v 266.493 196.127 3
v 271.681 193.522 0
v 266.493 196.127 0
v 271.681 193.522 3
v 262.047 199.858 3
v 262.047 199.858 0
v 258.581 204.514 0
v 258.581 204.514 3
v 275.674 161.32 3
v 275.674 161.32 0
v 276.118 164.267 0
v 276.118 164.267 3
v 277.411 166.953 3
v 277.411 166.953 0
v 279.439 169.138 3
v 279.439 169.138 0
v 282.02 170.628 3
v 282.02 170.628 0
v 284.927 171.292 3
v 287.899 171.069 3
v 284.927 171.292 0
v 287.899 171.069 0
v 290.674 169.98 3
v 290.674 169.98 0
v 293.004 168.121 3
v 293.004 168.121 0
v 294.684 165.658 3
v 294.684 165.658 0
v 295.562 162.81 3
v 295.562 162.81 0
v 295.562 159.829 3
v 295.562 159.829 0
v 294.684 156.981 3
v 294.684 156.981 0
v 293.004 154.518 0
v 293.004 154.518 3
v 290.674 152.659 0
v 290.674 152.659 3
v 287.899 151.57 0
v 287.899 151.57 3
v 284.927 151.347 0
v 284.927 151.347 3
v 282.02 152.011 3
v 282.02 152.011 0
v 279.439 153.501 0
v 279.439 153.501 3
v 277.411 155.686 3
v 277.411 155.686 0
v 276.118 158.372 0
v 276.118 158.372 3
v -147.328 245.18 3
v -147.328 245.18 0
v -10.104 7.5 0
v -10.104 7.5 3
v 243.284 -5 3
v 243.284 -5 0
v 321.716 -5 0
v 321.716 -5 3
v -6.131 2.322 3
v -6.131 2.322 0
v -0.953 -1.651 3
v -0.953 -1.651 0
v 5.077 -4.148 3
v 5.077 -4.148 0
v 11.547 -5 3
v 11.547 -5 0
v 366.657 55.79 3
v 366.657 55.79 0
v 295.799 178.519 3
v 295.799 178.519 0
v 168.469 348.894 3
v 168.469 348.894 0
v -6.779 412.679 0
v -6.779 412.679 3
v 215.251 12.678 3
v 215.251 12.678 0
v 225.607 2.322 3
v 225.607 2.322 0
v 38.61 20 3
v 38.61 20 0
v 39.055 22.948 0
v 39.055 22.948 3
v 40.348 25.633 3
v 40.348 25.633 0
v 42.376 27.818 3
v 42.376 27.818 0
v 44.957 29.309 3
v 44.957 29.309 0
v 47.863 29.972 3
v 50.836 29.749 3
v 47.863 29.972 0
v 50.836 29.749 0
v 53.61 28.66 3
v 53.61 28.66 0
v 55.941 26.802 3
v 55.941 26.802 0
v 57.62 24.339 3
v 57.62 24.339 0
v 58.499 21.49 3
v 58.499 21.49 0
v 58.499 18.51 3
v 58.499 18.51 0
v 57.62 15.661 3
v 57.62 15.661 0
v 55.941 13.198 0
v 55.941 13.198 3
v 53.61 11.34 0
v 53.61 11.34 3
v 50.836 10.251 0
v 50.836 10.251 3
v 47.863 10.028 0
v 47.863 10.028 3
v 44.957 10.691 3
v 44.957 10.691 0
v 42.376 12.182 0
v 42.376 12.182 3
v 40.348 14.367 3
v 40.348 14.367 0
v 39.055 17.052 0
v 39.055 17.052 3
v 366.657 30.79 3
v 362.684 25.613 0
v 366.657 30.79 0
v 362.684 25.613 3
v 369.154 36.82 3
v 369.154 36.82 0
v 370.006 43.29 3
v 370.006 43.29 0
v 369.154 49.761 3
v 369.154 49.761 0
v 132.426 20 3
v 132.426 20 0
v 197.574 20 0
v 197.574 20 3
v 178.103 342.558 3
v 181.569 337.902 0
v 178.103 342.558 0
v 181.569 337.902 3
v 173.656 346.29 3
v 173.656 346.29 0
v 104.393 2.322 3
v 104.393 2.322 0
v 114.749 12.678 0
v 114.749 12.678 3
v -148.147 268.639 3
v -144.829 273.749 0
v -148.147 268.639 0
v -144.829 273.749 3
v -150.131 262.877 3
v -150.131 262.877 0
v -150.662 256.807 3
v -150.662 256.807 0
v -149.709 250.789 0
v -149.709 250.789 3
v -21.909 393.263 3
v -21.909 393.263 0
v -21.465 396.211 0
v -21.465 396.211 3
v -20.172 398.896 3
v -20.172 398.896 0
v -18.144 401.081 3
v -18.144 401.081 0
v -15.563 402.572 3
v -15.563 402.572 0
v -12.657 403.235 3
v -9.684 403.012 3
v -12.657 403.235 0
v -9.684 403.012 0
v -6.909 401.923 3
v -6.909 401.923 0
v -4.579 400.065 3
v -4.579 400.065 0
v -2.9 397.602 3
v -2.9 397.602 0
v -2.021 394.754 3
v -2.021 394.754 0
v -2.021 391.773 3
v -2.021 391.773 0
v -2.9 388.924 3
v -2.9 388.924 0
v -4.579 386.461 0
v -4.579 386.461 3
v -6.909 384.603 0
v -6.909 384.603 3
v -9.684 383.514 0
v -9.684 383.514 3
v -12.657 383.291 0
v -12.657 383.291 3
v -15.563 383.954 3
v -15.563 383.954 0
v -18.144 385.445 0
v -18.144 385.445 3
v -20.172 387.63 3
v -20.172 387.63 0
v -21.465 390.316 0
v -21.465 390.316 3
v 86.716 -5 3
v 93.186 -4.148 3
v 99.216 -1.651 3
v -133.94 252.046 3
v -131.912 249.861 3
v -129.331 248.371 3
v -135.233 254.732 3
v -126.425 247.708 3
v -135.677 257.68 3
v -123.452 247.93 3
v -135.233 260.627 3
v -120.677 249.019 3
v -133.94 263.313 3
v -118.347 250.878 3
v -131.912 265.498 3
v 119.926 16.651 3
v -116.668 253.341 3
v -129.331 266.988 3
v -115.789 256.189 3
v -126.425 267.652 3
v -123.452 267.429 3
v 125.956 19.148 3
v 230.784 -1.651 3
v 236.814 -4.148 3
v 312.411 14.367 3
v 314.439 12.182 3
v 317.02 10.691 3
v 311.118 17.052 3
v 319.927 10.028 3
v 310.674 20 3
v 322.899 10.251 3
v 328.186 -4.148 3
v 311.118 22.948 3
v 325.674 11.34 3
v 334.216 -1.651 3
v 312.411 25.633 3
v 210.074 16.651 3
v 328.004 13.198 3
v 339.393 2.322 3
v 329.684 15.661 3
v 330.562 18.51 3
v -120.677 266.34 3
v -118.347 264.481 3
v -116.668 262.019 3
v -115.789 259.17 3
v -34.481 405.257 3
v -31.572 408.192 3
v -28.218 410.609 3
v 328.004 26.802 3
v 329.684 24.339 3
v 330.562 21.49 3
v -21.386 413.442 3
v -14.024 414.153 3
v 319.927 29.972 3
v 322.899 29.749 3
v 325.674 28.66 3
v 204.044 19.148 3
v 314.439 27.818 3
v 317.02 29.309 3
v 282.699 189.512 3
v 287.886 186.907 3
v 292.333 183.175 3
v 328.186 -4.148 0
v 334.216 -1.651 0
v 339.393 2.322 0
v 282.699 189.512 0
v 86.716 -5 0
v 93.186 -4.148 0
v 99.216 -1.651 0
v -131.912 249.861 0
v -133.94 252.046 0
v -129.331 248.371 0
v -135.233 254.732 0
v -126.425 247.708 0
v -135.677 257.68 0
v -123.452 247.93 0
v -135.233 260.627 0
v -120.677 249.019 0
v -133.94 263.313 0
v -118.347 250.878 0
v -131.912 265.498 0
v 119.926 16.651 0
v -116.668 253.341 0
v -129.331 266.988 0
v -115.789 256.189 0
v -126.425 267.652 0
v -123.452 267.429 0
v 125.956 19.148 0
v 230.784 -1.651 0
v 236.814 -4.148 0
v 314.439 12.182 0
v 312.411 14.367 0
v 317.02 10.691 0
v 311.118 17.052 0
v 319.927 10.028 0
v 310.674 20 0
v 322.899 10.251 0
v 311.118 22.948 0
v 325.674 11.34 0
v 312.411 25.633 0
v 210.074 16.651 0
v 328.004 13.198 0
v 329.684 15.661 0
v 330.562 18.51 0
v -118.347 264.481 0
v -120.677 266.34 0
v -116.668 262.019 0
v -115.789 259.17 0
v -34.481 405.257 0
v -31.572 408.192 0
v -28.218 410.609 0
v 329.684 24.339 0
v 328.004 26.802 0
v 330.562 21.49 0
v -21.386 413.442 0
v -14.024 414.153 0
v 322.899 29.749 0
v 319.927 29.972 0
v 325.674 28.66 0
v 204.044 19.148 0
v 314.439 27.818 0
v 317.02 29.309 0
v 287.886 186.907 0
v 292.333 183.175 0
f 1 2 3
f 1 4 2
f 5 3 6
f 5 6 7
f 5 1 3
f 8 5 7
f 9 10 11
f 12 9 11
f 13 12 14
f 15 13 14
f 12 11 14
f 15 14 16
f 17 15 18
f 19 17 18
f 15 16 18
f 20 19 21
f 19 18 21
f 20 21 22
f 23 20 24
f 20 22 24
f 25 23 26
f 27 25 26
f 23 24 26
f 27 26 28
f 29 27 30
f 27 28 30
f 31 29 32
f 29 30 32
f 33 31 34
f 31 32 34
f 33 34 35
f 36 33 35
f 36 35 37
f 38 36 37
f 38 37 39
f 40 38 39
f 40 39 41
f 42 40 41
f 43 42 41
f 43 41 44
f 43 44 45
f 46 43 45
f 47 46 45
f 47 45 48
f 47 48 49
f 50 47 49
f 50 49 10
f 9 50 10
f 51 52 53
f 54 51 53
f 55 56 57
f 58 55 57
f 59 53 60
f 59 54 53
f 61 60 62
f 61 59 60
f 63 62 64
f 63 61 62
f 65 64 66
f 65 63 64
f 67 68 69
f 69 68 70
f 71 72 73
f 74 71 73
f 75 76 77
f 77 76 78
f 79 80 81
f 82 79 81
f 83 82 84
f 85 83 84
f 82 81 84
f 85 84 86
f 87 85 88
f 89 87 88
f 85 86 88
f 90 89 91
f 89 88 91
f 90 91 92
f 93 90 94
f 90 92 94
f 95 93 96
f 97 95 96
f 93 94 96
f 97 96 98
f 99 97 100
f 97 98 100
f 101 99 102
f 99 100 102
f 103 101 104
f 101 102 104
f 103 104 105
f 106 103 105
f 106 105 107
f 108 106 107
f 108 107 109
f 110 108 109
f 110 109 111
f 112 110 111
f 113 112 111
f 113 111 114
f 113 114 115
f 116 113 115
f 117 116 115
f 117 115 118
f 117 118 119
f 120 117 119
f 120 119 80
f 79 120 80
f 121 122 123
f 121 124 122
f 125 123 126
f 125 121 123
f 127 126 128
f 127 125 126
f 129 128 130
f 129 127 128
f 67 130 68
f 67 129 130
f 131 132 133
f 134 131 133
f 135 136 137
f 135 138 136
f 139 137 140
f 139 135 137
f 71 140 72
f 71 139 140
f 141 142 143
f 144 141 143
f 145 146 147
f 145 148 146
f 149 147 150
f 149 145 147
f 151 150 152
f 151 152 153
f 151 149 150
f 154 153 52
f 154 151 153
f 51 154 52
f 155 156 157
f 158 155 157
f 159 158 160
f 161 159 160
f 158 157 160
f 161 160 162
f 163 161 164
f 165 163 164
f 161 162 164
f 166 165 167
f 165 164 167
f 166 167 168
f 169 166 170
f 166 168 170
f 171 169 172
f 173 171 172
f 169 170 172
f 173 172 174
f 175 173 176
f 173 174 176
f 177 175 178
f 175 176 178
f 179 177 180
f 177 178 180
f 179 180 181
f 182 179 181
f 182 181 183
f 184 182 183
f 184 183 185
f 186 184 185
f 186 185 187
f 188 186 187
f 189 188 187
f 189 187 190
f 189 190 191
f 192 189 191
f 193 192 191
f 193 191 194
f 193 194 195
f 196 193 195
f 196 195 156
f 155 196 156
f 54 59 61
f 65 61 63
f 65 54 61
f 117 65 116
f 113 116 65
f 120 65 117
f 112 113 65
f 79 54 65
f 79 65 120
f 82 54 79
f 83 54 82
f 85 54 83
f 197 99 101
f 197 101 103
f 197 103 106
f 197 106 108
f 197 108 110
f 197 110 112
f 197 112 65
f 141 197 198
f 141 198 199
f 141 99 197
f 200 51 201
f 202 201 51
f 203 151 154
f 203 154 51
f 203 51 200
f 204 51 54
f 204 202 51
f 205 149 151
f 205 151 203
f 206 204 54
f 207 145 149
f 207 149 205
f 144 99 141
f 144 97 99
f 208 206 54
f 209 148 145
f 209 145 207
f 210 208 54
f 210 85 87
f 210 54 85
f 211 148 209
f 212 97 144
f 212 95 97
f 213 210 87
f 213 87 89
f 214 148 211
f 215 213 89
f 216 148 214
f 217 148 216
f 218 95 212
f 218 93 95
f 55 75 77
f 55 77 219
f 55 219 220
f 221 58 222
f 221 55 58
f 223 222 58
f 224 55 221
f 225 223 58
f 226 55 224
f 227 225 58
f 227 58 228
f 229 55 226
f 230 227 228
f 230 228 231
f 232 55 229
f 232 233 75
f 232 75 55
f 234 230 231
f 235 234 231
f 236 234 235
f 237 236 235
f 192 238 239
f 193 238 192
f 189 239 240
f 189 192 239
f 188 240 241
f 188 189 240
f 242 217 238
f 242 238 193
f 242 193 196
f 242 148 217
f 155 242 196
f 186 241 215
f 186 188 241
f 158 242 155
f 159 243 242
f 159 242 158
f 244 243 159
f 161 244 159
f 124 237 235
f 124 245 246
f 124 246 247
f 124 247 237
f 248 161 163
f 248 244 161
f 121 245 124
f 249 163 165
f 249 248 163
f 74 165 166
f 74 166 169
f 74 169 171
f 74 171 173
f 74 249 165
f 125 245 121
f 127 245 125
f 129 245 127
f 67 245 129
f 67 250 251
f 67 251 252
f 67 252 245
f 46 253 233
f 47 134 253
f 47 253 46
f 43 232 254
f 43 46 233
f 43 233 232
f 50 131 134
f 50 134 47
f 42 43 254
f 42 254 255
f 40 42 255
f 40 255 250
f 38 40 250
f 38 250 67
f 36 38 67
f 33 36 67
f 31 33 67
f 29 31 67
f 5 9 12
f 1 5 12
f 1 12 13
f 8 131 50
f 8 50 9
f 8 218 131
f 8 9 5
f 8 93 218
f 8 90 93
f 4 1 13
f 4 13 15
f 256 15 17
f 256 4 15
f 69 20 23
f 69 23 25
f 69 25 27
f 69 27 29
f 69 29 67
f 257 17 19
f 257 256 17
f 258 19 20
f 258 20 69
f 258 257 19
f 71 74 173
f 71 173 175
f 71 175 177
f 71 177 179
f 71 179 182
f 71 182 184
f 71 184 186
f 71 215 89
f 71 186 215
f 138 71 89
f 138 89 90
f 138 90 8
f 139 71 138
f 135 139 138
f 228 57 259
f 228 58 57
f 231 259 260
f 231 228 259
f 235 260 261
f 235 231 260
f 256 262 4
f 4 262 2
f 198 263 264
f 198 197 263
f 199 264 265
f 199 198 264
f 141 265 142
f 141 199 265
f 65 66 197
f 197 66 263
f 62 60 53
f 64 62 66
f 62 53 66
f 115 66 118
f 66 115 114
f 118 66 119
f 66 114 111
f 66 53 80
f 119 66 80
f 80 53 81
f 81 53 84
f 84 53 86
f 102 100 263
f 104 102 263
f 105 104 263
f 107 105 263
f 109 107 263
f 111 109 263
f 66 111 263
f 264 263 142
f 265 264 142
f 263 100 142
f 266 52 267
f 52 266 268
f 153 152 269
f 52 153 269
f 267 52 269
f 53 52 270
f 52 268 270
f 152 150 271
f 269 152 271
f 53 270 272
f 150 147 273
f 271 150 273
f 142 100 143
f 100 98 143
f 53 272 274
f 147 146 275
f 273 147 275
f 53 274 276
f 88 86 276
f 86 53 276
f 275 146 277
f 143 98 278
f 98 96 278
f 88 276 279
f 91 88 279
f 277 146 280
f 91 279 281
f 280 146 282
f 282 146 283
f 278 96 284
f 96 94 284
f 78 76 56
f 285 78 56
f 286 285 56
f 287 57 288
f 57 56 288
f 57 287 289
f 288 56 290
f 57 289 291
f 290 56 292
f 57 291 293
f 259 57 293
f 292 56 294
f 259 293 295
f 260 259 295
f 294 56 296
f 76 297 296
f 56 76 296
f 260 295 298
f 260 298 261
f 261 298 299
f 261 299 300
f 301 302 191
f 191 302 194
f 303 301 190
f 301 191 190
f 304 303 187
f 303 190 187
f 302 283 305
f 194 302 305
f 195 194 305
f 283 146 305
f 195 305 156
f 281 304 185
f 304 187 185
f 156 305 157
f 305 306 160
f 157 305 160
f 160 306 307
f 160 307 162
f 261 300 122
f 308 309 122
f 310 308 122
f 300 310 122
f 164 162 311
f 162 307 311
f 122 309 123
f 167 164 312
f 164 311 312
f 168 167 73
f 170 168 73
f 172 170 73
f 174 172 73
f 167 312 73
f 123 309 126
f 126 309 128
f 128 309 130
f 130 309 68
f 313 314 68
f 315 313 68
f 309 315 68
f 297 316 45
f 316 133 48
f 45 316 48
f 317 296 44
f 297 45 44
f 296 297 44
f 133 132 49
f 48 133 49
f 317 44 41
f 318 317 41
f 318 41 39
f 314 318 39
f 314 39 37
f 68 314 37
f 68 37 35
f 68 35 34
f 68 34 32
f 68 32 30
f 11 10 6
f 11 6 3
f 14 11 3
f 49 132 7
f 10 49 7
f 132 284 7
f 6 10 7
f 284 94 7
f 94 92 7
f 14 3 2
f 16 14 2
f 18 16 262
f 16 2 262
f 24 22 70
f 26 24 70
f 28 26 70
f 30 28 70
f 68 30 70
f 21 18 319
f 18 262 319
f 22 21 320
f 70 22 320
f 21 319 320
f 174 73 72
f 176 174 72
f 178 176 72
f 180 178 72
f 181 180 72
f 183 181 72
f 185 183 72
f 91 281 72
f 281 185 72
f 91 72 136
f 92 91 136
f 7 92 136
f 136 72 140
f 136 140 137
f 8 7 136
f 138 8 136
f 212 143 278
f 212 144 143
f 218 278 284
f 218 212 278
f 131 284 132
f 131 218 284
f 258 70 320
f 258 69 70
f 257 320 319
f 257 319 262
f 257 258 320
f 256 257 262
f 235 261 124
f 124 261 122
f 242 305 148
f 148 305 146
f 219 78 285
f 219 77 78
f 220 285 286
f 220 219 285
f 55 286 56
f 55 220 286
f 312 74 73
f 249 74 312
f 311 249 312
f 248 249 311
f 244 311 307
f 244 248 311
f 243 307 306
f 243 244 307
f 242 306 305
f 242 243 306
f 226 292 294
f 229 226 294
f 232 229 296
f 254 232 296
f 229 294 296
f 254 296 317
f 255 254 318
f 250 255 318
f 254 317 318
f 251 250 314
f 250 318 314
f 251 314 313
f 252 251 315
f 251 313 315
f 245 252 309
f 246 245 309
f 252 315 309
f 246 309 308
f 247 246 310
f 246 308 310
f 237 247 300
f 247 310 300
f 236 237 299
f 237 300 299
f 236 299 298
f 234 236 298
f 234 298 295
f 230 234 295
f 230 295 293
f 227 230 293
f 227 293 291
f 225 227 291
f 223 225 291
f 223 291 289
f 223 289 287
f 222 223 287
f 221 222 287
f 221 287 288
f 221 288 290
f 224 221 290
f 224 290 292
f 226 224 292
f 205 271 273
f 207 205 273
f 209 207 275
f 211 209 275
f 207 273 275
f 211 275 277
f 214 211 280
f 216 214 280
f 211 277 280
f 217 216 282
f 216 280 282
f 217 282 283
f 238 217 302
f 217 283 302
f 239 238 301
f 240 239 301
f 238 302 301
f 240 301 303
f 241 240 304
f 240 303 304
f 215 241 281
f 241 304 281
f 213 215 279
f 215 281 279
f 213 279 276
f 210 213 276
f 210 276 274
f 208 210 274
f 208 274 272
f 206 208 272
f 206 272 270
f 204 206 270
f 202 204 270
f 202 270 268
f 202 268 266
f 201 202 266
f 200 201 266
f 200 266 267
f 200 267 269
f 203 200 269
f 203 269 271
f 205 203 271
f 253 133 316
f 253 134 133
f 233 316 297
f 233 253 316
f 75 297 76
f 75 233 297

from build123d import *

# Parameters (mm, degrees)
RESSALTO_EXTRUS_O1_DEPTH = 3
FILETE1_R                = 25
ESBO_O2_R                = 10
CORTE_EXTRUS_O1_DEPTH    = 556.395887416


with BuildPart() as part:
    # Esboço1 → Ressalto-extrusão1 (new body)
    with BuildSketch(Plane.XY):
        Polygon((-18.228540014, 416.846731975), (-150, 259.807621135), (0, 0), (95, 0), (120, 25), (210, 25), (235, 0), (330, 0), (370, 40), (287.829512447, 182.323459324), (259.709984143, 192.558130628), (169.709984143, 348.44270331), align=None)
        Polygon((0, 0), (-150, 259.807621135), (-18.228540014, 416.846731975), (-23.228540014, 418.666583146), (-156.080645864, 260.339608715), (-2.886751346, -5), (97.071067812, -5), (122.071067812, 20), (207.928932188, 20), (232.928932188, -5), (332.071067812, -5), (376.248444489, 39.177376677), (291.249713881, 186.399496669), (263.130185576, 196.634167974), (177.019495143, 345.782258878), (169.709984143, 348.44270331), (259.709984143, 192.558130628), (287.829512447, 182.323459324), (370, 40), (330, 0), (235, 0), (210, 25), (120, 25), (95, 0), align=None)
    extrude(amount=RESSALTO_EXTRUS_O1_DEPTH)

    # Filete1
    filete1_edges = [part.edges().sort_by_distance(p)[0] for p in [
        (177.019495143, 345.782258878, 1.5),
        (263.130185576, 196.634167974, 1.5),
        (291.249713881, 186.399496669, 1.5),
        (376.248444489, 39.177376677, 1.5),
        (332.071067812, -5, 1.5),
        (232.928932188, -5, 1.5),
        (207.928932188, 20, 1.5),
        (122.071067812, 20, 1.5),
        (97.071067812, -5, 1.5),
        (-2.886751346, -5, 1.5),
        (-156.080645864, 260.339608715, 1.5),
        (-23.228540014, 418.666583146, 1.5),
    ]]
    fillet(filete1_edges, radius=FILETE1_R)

    # Esboço2 → Corte-extrusão1 (cut, through all)
    with BuildSketch(Plane(origin=(0, 0, 0), x_dir=(-1, 0, 0), z_dir=(0, 0, -1))):
        with Locations((11.909345747, 393.263177907)):
            Circle(ESBO_O2_R)
        with Locations((125.677416542, 257.679670815)):
            Circle(ESBO_O2_R)
        with Locations((-48.61042611, 20)):
            Circle(ESBO_O2_R)
        with Locations((-320.673846837, 20)):
            Circle(ESBO_O2_R)
        with Locations((-285.673846837, 161.319502665)):
            Circle(ESBO_O2_R)
    extrude(amount=-CORTE_EXTRUS_O1_DEPTH, mode=Mode.SUBTRACT)


solid = part.part
